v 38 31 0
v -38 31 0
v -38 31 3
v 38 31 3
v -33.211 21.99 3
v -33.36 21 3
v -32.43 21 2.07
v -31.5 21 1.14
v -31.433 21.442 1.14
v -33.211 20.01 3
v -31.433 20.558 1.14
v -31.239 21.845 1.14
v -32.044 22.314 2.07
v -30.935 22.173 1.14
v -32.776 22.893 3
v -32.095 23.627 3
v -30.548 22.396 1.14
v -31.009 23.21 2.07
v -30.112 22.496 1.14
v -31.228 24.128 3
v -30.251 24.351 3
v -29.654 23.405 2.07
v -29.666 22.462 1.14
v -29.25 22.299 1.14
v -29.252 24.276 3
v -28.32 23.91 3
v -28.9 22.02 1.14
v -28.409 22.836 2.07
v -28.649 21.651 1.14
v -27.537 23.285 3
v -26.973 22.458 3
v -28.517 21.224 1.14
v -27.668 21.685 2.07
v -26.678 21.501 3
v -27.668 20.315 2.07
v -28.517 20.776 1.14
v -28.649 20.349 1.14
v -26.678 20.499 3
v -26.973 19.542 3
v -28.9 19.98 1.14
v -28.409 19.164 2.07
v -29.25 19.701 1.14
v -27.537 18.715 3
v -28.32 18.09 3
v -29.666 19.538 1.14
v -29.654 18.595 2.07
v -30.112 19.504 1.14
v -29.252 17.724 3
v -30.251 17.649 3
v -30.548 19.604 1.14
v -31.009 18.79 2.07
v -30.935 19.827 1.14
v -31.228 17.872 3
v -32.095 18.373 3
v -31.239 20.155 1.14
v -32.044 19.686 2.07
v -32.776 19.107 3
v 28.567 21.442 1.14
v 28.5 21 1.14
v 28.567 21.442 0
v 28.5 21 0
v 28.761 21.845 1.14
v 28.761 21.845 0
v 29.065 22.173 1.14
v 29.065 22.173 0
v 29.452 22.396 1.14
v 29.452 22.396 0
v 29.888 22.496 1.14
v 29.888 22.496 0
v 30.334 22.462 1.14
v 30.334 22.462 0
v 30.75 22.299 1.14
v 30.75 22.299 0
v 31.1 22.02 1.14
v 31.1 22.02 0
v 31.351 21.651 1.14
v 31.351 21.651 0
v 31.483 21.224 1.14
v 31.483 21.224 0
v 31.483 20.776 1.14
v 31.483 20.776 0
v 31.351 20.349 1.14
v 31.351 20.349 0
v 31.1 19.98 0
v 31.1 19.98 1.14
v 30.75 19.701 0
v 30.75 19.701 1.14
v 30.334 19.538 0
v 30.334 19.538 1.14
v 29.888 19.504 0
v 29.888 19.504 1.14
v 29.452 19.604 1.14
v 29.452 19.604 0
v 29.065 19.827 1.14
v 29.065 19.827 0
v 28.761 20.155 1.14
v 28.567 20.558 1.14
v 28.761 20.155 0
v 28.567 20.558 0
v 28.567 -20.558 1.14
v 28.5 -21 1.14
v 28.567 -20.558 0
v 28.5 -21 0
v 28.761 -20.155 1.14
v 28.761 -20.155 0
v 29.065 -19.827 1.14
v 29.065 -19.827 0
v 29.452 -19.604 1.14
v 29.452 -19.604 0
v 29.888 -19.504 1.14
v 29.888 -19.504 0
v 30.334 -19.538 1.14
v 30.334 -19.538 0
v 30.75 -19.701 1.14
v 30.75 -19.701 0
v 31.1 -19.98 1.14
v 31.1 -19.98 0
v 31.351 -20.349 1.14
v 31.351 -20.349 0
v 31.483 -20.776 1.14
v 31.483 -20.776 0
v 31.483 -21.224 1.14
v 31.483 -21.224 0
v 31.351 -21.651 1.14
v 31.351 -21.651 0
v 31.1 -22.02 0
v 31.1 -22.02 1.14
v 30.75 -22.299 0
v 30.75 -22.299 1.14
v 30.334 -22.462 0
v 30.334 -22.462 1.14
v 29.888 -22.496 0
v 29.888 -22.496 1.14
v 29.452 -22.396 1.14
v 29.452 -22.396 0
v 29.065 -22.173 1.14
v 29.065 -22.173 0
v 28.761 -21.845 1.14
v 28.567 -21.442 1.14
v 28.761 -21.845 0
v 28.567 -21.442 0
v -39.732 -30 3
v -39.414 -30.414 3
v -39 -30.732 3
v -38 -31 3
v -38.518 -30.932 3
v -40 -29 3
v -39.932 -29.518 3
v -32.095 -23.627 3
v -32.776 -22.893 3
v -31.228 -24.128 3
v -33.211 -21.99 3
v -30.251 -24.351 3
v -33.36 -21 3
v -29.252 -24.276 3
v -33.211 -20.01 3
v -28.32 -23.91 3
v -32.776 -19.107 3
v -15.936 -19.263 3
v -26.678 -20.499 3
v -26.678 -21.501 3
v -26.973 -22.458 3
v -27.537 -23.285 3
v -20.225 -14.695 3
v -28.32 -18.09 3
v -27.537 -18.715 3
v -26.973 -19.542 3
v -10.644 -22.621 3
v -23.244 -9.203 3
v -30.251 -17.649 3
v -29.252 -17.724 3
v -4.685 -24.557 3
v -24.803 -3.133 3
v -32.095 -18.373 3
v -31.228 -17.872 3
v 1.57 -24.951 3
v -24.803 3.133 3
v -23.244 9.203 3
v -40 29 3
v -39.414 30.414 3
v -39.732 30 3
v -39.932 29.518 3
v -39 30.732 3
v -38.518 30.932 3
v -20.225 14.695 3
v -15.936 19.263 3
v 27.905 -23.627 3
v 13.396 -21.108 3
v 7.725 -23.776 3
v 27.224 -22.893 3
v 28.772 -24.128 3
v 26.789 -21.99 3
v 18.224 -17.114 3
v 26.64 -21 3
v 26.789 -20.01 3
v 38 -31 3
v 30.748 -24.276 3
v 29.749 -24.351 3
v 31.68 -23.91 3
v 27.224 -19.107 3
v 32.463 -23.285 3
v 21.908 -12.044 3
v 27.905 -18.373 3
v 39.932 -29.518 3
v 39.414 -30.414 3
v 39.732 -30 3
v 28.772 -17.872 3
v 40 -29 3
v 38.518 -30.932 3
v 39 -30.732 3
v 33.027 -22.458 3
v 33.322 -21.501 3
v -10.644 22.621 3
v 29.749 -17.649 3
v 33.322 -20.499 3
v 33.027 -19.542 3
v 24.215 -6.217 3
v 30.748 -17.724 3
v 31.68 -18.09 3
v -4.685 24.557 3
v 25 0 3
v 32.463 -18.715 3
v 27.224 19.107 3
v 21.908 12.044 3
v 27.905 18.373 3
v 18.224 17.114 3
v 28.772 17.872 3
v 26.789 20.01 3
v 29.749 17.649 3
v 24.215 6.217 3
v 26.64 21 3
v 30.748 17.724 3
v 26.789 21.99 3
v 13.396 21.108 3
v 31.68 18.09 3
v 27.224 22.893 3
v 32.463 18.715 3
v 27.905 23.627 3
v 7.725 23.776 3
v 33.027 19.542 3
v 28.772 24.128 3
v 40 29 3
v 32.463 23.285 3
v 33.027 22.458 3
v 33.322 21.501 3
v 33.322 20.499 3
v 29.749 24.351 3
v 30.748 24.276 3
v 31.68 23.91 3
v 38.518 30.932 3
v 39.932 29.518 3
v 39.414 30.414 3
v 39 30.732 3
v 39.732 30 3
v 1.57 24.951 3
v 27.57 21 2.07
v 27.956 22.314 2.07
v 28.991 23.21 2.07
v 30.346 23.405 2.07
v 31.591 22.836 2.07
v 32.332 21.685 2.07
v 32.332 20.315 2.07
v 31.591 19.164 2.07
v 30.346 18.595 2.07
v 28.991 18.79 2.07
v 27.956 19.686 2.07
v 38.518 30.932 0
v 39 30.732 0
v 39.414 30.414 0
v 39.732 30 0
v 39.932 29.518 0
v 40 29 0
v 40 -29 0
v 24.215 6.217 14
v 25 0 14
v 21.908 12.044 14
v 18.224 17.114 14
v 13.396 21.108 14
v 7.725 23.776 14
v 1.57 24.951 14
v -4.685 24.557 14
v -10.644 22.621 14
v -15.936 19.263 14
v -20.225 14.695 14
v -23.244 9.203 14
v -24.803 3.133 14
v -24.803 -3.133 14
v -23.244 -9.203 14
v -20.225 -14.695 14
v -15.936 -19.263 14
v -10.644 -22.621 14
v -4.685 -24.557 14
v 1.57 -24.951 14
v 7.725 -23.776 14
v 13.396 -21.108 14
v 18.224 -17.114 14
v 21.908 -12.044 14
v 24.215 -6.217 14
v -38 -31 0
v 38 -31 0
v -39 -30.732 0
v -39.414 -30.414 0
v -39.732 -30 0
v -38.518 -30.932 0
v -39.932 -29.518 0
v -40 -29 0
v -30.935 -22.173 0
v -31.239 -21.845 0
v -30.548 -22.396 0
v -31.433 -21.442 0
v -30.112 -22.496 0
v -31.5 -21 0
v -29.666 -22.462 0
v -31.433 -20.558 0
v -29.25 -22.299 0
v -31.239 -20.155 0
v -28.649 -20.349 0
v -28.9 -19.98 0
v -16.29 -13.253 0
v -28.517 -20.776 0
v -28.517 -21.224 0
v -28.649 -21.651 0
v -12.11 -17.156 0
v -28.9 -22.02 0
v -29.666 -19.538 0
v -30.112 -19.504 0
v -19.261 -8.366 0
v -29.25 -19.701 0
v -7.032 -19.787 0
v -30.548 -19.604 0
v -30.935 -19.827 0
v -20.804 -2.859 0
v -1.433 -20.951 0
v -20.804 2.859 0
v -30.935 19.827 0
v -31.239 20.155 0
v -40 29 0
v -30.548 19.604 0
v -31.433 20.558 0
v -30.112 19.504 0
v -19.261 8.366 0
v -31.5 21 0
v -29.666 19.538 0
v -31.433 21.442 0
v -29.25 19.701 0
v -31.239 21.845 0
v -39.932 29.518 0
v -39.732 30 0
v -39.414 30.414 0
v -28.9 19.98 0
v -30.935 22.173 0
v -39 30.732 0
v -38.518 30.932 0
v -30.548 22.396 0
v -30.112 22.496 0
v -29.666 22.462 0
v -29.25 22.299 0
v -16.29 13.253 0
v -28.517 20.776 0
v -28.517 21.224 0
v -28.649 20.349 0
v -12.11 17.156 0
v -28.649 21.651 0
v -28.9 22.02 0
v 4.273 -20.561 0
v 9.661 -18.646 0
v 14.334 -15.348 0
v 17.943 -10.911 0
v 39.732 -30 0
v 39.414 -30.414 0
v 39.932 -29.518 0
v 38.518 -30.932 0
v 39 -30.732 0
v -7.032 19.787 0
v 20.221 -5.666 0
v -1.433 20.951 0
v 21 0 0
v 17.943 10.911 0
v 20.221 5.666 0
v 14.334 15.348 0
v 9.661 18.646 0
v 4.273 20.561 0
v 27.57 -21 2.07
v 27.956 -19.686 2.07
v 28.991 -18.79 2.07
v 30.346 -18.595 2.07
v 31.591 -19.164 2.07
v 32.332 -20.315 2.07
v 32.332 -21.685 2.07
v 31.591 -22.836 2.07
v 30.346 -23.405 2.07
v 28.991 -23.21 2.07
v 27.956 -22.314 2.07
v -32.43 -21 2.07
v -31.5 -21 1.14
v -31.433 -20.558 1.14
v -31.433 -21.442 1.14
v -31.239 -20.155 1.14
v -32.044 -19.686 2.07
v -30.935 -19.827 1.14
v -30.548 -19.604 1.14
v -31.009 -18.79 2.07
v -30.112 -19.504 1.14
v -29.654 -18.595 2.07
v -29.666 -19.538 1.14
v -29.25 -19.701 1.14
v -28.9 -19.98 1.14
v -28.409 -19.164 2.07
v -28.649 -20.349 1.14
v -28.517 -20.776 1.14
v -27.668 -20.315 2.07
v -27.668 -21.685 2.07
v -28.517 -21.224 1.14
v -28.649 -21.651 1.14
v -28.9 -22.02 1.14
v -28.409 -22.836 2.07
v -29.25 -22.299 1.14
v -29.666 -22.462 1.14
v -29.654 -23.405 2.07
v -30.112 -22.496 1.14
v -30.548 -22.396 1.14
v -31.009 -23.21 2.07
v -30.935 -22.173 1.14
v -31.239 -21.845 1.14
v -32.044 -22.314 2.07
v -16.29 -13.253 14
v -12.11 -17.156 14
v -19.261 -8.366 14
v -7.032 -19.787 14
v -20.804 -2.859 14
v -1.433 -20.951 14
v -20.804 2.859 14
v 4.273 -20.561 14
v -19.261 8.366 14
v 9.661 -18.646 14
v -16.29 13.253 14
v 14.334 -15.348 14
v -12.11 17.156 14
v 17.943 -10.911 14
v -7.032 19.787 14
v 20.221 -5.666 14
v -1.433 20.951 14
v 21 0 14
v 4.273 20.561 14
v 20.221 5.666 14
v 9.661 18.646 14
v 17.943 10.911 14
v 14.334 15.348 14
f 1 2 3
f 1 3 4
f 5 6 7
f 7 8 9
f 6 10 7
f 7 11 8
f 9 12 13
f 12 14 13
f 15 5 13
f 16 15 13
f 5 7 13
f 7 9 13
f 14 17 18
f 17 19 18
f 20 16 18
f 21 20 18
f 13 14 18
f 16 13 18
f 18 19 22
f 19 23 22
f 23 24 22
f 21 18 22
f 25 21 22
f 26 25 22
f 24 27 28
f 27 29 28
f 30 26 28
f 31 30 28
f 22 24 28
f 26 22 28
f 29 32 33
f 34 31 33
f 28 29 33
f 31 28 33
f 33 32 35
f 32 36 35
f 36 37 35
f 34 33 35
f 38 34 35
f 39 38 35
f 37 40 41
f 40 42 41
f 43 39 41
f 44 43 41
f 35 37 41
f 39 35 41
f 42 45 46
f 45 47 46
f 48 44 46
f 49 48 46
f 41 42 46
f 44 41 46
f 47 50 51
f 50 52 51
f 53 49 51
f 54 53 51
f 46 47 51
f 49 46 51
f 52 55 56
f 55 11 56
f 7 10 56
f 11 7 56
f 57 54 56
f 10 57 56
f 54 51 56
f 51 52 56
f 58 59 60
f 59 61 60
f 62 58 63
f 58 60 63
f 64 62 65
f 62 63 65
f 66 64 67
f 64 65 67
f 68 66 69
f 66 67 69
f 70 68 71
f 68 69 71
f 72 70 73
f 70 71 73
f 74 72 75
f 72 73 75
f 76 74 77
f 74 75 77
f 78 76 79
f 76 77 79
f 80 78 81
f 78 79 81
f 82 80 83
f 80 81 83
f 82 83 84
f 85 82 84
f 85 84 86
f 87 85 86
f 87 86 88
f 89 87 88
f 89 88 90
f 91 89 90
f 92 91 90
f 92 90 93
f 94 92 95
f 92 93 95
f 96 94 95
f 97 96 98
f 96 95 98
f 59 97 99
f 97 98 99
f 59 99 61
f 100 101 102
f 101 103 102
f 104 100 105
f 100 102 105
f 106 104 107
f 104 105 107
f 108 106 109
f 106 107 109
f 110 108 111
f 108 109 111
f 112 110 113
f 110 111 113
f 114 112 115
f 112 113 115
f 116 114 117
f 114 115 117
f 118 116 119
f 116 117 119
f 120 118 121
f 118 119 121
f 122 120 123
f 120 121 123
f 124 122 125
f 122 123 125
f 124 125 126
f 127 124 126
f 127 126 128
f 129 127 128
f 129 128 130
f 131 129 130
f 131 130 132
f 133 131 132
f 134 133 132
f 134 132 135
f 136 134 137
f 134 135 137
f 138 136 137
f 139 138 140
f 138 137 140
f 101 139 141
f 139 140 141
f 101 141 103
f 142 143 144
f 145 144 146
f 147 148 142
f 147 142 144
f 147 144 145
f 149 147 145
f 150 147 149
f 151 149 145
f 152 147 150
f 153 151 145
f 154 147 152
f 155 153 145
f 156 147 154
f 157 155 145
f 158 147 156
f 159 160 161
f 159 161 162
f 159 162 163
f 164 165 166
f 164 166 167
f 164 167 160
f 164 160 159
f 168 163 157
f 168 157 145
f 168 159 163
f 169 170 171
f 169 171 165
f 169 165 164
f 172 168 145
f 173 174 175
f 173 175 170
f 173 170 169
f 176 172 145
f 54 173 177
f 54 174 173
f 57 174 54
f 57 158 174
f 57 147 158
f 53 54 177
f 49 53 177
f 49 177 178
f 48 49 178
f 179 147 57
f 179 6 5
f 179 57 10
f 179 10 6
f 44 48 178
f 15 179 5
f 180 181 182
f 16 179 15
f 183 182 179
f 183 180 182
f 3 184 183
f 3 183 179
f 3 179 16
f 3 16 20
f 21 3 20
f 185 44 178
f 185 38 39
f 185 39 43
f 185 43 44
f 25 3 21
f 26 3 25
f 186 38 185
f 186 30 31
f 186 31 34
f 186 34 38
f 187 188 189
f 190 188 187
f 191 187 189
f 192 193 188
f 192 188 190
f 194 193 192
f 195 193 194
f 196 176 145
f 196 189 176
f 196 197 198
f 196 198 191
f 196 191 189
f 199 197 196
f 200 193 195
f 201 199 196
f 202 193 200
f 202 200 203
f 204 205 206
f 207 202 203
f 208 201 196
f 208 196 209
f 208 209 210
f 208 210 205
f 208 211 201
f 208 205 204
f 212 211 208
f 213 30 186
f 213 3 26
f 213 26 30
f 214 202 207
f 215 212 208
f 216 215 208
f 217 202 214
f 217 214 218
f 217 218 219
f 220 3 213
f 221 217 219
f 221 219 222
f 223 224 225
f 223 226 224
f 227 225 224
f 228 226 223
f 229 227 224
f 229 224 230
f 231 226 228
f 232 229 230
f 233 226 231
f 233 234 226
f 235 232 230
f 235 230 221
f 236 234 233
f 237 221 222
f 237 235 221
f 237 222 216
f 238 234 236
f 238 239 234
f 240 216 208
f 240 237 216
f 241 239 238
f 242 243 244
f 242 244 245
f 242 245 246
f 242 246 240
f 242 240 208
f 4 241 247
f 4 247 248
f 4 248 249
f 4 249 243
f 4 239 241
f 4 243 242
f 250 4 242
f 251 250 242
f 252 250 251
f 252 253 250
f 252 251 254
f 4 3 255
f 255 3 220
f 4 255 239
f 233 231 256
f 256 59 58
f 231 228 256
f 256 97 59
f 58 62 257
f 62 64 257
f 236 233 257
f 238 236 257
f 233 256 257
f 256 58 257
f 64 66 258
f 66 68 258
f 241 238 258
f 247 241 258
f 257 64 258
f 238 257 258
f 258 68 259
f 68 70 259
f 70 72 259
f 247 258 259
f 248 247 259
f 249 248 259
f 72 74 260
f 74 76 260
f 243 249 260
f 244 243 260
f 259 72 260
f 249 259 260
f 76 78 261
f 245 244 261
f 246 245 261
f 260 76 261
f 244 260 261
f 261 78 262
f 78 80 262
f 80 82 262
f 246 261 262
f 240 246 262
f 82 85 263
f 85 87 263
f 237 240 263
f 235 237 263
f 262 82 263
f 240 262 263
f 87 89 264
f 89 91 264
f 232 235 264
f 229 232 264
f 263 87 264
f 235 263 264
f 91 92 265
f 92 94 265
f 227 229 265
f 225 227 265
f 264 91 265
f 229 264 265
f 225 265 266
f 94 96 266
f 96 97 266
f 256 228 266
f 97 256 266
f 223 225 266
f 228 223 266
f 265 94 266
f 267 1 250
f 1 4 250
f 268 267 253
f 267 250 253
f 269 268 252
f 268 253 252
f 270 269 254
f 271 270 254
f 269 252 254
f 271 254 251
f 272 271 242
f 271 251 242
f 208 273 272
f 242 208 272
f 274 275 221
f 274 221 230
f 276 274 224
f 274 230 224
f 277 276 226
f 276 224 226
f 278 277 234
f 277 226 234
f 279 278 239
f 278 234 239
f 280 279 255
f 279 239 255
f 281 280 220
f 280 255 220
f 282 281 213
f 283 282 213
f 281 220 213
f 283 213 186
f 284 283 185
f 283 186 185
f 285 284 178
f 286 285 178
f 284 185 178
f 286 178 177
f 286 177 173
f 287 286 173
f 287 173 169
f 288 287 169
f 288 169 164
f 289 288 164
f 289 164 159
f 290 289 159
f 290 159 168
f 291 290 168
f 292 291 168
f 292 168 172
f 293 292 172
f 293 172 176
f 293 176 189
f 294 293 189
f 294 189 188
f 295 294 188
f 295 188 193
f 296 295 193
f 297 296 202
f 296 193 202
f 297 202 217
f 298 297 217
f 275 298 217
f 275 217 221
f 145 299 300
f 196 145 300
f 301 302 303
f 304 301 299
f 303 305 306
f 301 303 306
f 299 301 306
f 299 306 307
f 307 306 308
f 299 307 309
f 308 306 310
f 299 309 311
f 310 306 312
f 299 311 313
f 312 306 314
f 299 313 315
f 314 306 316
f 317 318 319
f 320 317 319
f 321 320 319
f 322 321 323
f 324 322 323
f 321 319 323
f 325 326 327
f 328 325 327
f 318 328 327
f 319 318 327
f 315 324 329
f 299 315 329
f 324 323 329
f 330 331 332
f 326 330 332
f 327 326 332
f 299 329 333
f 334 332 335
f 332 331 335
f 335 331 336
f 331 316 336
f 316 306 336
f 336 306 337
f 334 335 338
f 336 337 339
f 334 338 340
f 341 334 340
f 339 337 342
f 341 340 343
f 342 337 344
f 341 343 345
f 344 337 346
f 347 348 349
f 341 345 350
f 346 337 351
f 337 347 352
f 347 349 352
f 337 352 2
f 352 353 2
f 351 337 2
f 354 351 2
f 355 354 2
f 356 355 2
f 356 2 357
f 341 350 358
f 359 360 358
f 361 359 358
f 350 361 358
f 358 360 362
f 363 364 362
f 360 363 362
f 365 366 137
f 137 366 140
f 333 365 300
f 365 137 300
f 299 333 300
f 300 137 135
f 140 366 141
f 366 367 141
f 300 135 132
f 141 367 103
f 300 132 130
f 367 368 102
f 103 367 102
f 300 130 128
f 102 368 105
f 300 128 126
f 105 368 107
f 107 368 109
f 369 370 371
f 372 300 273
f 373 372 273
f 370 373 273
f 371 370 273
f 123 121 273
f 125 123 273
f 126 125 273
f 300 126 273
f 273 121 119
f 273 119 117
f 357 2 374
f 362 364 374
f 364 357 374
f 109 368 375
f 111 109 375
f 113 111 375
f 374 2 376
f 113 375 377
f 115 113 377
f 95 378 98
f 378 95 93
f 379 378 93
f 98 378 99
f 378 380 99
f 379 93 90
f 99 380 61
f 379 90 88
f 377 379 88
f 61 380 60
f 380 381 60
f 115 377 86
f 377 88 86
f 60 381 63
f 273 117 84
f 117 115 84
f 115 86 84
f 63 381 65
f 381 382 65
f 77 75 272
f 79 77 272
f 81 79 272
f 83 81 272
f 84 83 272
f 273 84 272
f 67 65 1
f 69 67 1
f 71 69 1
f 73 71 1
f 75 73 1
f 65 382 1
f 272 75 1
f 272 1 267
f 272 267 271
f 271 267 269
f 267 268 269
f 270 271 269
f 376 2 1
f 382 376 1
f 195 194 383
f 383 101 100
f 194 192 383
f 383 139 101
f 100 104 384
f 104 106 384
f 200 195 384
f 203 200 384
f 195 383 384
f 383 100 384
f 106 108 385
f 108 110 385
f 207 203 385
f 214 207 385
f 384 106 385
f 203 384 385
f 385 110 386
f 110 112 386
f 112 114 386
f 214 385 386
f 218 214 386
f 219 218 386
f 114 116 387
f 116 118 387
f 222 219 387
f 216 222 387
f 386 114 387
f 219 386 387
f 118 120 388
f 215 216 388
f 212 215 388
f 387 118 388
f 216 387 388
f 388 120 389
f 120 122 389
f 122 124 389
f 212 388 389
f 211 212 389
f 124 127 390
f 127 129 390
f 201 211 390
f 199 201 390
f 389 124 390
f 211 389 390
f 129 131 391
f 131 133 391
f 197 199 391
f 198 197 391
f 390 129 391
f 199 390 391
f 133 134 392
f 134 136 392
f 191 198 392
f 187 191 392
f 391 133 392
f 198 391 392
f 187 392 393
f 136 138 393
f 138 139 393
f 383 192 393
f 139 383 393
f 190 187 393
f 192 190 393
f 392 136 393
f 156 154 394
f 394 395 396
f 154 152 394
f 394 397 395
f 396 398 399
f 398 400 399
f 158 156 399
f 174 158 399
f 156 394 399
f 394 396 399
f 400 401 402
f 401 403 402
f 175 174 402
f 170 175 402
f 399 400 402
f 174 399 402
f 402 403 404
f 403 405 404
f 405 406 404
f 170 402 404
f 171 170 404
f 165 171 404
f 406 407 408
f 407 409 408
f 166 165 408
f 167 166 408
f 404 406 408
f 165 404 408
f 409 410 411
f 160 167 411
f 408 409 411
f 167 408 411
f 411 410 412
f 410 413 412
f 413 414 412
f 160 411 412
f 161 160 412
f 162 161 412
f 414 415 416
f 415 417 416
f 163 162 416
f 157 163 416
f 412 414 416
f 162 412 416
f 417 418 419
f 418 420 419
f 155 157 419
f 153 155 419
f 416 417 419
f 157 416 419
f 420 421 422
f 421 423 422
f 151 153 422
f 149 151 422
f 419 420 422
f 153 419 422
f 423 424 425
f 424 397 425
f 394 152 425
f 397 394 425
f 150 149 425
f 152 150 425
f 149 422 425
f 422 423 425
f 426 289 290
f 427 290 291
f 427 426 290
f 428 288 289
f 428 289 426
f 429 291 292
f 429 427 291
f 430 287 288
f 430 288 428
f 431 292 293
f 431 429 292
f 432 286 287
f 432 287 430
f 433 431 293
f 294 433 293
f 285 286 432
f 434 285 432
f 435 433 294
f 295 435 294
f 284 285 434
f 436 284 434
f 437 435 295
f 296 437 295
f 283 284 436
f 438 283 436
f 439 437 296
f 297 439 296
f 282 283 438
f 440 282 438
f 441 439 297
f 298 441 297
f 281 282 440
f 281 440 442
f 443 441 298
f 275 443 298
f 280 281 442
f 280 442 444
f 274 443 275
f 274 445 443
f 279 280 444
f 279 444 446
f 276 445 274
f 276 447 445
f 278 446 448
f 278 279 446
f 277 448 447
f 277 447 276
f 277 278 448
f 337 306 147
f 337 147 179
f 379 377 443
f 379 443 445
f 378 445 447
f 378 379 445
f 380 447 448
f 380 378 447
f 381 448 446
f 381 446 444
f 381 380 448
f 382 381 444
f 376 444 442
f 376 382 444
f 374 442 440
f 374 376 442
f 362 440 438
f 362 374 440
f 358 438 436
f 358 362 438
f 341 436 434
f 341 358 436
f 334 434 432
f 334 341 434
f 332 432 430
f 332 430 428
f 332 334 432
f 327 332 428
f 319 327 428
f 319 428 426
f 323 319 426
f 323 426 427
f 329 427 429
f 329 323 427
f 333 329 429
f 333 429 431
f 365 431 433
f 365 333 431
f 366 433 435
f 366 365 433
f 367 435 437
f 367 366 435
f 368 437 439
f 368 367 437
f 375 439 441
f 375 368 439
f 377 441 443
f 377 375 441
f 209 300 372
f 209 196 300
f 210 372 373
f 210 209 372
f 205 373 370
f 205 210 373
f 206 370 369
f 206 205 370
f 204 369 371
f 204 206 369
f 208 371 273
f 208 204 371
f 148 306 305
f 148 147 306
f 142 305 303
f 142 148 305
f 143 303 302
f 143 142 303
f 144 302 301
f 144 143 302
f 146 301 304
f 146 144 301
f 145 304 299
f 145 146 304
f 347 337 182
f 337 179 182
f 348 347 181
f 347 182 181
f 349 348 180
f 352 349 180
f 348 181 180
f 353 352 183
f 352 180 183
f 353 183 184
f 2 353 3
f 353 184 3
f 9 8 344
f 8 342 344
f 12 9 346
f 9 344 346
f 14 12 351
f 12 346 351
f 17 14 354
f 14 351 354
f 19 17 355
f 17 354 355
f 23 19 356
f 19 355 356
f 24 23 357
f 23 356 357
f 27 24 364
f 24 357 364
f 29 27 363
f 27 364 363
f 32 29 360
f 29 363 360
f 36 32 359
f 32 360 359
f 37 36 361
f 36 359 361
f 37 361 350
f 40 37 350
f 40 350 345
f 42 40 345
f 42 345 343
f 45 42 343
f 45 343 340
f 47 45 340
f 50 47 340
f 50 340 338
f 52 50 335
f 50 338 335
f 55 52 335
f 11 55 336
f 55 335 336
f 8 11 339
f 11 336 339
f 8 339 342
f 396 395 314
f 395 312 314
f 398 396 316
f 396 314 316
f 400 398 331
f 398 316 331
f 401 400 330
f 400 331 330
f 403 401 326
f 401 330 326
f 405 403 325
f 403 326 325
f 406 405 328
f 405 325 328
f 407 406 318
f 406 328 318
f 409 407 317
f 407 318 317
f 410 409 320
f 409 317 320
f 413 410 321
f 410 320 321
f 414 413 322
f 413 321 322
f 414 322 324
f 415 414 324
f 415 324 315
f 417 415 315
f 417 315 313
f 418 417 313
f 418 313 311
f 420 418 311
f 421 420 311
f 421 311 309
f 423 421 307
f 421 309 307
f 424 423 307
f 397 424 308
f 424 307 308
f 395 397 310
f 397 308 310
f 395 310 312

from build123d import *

# Parameters (mm, degrees)
F0_R           = 25
F0_R_2         = 21
F1_DEPTH       = 14
F0_W           = 80
F0_H           = 62
F2_DEPTH       = 3
F3_R           = 2
F5_D           = 3
F5_CSINK_D     = 6.72
F5_CSINK_ANGLE = 90


with BuildPart() as f1:
    # F0 (on Top) → F1 (new body)
    with BuildSketch(Plane.XY):
        Circle(F0_R)
        Circle(F0_R_2, mode=Mode.SUBTRACT)
    extrude(amount=F1_DEPTH)

    # F0 (on Top) → F2 (join)
    with BuildSketch(Plane.XY):
        Rectangle(F0_W, F0_H)
        Circle(F0_R, mode=Mode.SUBTRACT)
    extrude(amount=F2_DEPTH)

    # F3
    f3_edges = [f1.edges().sort_by_distance(p)[0] for p in [
        (-40, -31, 1.5),
        (40, -31, 1.5),
        (40, 31, 1.5),
        (-40, 31, 1.5),
    ]]
    fillet(f3_edges, radius=F3_R)

    # F5 (through all)
    with Locations(Plane.XY.offset(3)):
        with Locations((-30, 21), (-30, -21), (30, -21), (30, 21)):
            CounterSinkHole(F5_D / 2, F5_CSINK_D / 2, counter_sink_angle=F5_CSINK_ANGLE)


solid = f1.part
